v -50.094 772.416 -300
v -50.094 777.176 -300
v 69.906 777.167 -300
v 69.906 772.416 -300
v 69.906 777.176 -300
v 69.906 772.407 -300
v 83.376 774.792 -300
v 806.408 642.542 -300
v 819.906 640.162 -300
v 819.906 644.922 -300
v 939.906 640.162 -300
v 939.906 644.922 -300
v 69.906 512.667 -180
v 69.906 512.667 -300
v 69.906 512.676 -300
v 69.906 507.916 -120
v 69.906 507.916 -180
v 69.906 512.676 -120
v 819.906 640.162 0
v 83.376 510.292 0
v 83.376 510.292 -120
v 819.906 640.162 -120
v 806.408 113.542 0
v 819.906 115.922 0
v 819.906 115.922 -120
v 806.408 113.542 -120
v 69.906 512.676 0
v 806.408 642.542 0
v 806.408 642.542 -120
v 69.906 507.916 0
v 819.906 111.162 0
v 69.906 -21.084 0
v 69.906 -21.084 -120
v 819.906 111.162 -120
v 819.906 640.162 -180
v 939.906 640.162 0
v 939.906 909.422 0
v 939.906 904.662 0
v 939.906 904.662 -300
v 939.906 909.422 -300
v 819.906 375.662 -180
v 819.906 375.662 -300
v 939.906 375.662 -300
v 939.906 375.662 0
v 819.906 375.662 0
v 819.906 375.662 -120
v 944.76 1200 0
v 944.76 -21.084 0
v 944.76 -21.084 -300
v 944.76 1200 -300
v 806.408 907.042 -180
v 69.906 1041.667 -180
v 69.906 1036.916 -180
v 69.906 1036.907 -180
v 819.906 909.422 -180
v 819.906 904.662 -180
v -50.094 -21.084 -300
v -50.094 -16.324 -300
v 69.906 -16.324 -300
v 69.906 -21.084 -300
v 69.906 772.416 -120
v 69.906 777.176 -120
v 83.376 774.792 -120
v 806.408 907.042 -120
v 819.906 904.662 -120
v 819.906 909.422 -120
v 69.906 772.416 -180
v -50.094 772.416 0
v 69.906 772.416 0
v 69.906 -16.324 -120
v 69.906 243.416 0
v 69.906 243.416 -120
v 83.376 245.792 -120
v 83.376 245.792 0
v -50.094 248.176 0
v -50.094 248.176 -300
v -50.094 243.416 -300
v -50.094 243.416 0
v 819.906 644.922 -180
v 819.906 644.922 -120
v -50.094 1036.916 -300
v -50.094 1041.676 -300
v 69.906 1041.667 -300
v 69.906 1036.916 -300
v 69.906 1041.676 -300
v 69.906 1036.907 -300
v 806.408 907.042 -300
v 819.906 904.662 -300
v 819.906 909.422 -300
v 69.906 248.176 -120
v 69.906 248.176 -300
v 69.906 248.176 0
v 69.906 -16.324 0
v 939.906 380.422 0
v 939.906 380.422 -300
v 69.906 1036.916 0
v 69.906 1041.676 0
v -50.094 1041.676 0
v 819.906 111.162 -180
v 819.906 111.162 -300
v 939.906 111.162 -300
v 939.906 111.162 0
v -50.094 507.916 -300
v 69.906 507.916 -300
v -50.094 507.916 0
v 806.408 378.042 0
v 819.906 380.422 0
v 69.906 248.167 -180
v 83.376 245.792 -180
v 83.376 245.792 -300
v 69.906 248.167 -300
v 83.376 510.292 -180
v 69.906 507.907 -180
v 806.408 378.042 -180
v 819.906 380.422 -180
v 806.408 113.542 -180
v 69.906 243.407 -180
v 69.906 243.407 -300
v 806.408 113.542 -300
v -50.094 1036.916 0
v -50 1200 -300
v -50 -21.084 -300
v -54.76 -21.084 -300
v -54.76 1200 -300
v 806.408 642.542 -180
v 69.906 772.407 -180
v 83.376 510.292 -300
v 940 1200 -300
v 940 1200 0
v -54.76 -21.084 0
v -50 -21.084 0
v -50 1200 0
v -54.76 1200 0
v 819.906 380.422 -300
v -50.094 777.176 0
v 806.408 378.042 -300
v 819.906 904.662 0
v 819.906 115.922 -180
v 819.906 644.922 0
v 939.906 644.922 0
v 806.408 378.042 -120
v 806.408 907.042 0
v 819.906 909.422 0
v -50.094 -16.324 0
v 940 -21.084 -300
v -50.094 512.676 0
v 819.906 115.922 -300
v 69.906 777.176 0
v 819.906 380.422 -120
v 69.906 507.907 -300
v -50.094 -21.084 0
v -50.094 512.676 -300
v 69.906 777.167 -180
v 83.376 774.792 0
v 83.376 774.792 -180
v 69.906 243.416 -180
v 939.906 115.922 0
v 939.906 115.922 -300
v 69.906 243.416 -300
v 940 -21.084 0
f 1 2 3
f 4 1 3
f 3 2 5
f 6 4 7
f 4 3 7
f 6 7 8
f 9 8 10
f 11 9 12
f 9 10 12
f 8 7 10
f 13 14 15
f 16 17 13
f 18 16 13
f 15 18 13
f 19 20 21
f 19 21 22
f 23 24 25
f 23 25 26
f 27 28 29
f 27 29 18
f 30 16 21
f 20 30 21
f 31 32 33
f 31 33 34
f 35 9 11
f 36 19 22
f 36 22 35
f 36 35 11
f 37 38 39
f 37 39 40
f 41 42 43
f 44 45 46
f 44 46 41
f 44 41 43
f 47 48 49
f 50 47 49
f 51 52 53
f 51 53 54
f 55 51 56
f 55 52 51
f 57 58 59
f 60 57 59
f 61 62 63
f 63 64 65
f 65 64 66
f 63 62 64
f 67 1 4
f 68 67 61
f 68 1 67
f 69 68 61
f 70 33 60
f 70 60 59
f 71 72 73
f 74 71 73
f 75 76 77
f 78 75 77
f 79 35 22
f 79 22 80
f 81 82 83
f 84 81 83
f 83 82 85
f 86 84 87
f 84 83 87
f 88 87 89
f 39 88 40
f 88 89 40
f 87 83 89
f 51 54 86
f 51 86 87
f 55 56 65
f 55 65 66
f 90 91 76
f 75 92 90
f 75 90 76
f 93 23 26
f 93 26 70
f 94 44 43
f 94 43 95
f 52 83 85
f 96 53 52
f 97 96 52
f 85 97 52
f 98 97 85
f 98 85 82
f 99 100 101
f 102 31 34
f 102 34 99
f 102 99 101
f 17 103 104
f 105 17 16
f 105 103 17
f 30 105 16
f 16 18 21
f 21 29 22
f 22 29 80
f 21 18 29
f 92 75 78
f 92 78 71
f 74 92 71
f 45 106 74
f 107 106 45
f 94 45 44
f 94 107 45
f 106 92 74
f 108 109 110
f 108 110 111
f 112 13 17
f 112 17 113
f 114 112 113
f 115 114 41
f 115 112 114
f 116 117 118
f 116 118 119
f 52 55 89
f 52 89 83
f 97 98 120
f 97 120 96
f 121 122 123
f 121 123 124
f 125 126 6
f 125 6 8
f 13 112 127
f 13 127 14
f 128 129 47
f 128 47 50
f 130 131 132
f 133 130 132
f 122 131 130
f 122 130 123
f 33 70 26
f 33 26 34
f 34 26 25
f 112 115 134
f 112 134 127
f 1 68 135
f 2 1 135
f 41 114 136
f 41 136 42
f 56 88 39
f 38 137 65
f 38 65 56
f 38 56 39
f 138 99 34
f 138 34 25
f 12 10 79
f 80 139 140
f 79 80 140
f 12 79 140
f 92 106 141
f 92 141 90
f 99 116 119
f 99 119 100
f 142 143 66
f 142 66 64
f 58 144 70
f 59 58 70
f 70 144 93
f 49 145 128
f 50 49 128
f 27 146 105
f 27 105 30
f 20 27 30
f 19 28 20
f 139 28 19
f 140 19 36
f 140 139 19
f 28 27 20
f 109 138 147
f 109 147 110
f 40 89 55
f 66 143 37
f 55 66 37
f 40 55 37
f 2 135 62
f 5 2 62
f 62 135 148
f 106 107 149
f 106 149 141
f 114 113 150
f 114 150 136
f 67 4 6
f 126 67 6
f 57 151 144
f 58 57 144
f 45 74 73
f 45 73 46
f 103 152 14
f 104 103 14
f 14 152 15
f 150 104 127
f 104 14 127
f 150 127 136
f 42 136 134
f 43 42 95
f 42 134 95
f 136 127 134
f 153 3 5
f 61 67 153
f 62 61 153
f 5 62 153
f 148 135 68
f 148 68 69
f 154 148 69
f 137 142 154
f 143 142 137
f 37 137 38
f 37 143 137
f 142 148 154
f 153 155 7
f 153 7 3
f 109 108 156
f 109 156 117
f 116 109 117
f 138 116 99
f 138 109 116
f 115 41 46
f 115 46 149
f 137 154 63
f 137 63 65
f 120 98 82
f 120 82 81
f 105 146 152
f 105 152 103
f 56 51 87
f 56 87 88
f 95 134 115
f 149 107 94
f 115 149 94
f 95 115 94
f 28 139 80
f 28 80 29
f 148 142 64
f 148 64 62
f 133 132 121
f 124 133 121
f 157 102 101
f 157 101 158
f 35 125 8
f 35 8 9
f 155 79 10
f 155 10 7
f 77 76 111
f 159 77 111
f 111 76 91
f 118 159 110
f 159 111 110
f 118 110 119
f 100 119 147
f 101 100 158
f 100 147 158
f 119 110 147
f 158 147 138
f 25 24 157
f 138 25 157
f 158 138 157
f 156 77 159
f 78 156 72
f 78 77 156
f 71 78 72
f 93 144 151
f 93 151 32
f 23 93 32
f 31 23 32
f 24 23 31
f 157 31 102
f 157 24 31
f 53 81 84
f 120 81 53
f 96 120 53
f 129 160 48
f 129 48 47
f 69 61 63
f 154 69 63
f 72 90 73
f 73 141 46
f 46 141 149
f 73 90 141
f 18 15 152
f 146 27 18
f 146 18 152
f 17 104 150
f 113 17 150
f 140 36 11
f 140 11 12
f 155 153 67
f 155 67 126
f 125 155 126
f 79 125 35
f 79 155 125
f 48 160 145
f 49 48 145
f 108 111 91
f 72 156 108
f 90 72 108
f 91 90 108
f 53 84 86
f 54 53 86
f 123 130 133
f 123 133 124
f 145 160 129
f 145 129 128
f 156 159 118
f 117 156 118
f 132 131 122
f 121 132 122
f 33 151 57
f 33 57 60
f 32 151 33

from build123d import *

# Parameters (mm, degrees)
SKETCH4_W             = 120
SKETCH4_H             = 4.76
BOSS_EXTRUDE6_DEPTH   = 300
BOSS_EXTRUDE6_2_DEPTH = 300
BOSS_EXTRUDE6_3_DEPTH = 300
BOSS_EXTRUDE6_4_DEPTH = 300
BOSS_EXTRUDE6_5_DEPTH = 300
BOSS_EXTRUDE6_6_DEPTH = 300
BOSS_EXTRUDE6_7_DEPTH = 300
BOSS_EXTRUDE6_8_DEPTH = 300
BOSS_EXTRUDE6_9_DEPTH = 300
BOSS_EXTRUDE7_DEPTH   = 120
BOSS_EXTRUDE8_START   = -180
BOSS_EXTRUDE8_DEPTH   = 120
BOSS_EXTRUDE10_START  = -50
SKETCH5_W             = 300
SKETCH5_H             = 1221.083607577
BOSS_EXTRUDE10_DEPTH  = 4.76
BOSS_EXTRUDE11_START  = 940
SKETCH5_3_W           = 300
SKETCH5_3_H           = 1221.083607577
BOSS_EXTRUDE11_DEPTH  = 4.76


with BuildPart() as part:
    # Sketch4 → Boss-Extrude6 (new body)
    with BuildSketch(Plane.XY):
        with Locations((9.905526623, -18.703607577)):
            Rectangle(SKETCH4_W, SKETCH4_H)
    extrude(amount=-BOSS_EXTRUDE6_DEPTH)



with BuildPart() as body_2:
    # Sketch4 → Boss-Extrude6 2 (new body)
    with BuildSketch(Plane.XY):
        with Locations((879.905526623, 113.541627954)):
            Rectangle(SKETCH4_W, SKETCH4_H)
    extrude(amount=-BOSS_EXTRUDE6_2_DEPTH)


with BuildPart() as body_3:
    # Sketch4 → Boss-Extrude6 3 (new body)
    with BuildSketch(Plane.XY):
        with Locations((9.905526623, 245.796392423)):
            Rectangle(SKETCH4_W, SKETCH4_H)
    extrude(amount=-BOSS_EXTRUDE6_3_DEPTH)


with BuildPart() as body_4:
    # Sketch4 → Boss-Extrude6 4 (new body)
    with BuildSketch(Plane.XY):
        with Locations((879.905526623, 378.041627954)):
            Rectangle(SKETCH4_W, SKETCH4_H)
    extrude(amount=-BOSS_EXTRUDE6_4_DEPTH)


with BuildPart() as body_5:
    # Sketch4 → Boss-Extrude6 5 (new body)
    with BuildSketch(Plane.XY):
        with Locations((9.905526623, 510.296392423)):
            Rectangle(SKETCH4_W, SKETCH4_H)
    extrude(amount=-BOSS_EXTRUDE6_5_DEPTH)


with BuildPart() as body_6:
    # Sketch4 → Boss-Extrude6 6 (new body)
    with BuildSketch(Plane.XY):
        with Locations((879.905526623, 642.541627954)):
            Rectangle(SKETCH4_W, SKETCH4_H)
    extrude(amount=-BOSS_EXTRUDE6_6_DEPTH)


with BuildPart() as body_7:
    # Sketch4 → Boss-Extrude6 7 (new body)
    with BuildSketch(Plane.XY):
        with Locations((9.905526623, 774.796392423)):
            Rectangle(SKETCH4_W, SKETCH4_H)
    extrude(amount=-BOSS_EXTRUDE6_7_DEPTH)


with BuildPart() as body_8:
    # Sketch4 → Boss-Extrude6 8 (new body)
    with BuildSketch(Plane.XY):
        with Locations((879.905526623, 907.041627954)):
            Rectangle(SKETCH4_W, SKETCH4_H)
    extrude(amount=-BOSS_EXTRUDE6_8_DEPTH)


with BuildPart() as body_9:
    # Sketch4 → Boss-Extrude6 9 (new body)
    with BuildSketch(Plane.XY):
        with Locations((9.905526623, 1039.296392423)):
            Rectangle(SKETCH4_W, SKETCH4_H)
    extrude(amount=-BOSS_EXTRUDE6_9_DEPTH)


with BuildPart() as part_1:
    add(part.part)

    add(body_3.part)  # Boss-Extrude7 merges body 3

    add(body_5.part)  # Boss-Extrude7 merges body 5

    add(body_7.part)  # Boss-Extrude7 merges body 7
    # Sketch4<3> → Boss-Extrude7 (add)
    with BuildSketch(Plane.XY):
        Polygon((69.905526623, -16.323607577), (69.905526623, -21.083607577), (819.905526623, 111.161627954), (819.905526623, 115.921627954), align=None)
        Polygon((69.905526623, 248.176392423), (69.905526623, 243.416392423), (819.905526623, 375.661627954), (819.905526623, 380.421627954), align=None)
        Polygon((69.905526623, 507.916392423), (819.905526623, 640.161627954), (819.905526623, 644.921627954), (69.905526623, 512.676392423), align=None)
        Polygon((69.905526623, 772.416392423), (819.905526623, 904.661627954), (819.905526623, 909.421627954), (69.905526623, 777.176392423), align=None)
    extrude(amount=-BOSS_EXTRUDE7_DEPTH)


    add(body_2.part)  # Boss-Extrude8 merges body 2

    add(body_4.part)  # Boss-Extrude8 merges body 4

    add(body_6.part)  # Boss-Extrude8 merges body 6

    add(body_8.part)  # Boss-Extrude8 merges body 8

    add(body_9.part)  # Boss-Extrude8 merges body 9
    # Sketch4<4> → Boss-Extrude8 (add)
    with BuildSketch(Plane.XY.offset(BOSS_EXTRUDE8_START)):
        Polygon((819.905526623, 111.161627954), (819.905526623, 115.921627954), (69.905526623, 248.166863486), (69.905526623, 243.406863486), align=None)
        Polygon((819.905526623, 375.661627954), (819.905526623, 380.421627954), (69.905526623, 512.666863486), (69.905526623, 507.906863486), align=None)
        Polygon((819.905526623, 640.161627954), (819.905526623, 644.921627954), (69.905526623, 777.166863486), (69.905526623, 772.406863486), align=None)
        Polygon((819.905526623, 904.661627954), (819.905526623, 909.421627954), (69.905526623, 1041.666863486), (69.905526623, 1036.906863486), align=None)
    extrude(amount=-BOSS_EXTRUDE8_DEPTH)


with BuildPart() as body_2_2:
    # Sketch5 → Boss-Extrude10 (new body)
    with BuildSketch(Plane(origin=(0, 0, 0), x_dir=(0, 0, -1), z_dir=(1, 0, 0)).offset(BOSS_EXTRUDE10_START)):
        with Locations((150, 589.458196211)):
            Rectangle(SKETCH5_W, SKETCH5_H)
    extrude(amount=-BOSS_EXTRUDE10_DEPTH)


with BuildPart() as body_3_2:
    # Sketch5<3> → Boss-Extrude11 (new body)
    with BuildSketch(Plane(origin=(0, 0, 0), x_dir=(0, 0, -1), z_dir=(1, 0, 0)).offset(BOSS_EXTRUDE11_START)):
        with Locations((150, 589.458196211)):
            Rectangle(SKETCH5_3_W, SKETCH5_3_H)
    extrude(amount=BOSS_EXTRUDE11_DEPTH)


solid = Compound([part_1.part, body_2_2.part, body_3_2.part])
